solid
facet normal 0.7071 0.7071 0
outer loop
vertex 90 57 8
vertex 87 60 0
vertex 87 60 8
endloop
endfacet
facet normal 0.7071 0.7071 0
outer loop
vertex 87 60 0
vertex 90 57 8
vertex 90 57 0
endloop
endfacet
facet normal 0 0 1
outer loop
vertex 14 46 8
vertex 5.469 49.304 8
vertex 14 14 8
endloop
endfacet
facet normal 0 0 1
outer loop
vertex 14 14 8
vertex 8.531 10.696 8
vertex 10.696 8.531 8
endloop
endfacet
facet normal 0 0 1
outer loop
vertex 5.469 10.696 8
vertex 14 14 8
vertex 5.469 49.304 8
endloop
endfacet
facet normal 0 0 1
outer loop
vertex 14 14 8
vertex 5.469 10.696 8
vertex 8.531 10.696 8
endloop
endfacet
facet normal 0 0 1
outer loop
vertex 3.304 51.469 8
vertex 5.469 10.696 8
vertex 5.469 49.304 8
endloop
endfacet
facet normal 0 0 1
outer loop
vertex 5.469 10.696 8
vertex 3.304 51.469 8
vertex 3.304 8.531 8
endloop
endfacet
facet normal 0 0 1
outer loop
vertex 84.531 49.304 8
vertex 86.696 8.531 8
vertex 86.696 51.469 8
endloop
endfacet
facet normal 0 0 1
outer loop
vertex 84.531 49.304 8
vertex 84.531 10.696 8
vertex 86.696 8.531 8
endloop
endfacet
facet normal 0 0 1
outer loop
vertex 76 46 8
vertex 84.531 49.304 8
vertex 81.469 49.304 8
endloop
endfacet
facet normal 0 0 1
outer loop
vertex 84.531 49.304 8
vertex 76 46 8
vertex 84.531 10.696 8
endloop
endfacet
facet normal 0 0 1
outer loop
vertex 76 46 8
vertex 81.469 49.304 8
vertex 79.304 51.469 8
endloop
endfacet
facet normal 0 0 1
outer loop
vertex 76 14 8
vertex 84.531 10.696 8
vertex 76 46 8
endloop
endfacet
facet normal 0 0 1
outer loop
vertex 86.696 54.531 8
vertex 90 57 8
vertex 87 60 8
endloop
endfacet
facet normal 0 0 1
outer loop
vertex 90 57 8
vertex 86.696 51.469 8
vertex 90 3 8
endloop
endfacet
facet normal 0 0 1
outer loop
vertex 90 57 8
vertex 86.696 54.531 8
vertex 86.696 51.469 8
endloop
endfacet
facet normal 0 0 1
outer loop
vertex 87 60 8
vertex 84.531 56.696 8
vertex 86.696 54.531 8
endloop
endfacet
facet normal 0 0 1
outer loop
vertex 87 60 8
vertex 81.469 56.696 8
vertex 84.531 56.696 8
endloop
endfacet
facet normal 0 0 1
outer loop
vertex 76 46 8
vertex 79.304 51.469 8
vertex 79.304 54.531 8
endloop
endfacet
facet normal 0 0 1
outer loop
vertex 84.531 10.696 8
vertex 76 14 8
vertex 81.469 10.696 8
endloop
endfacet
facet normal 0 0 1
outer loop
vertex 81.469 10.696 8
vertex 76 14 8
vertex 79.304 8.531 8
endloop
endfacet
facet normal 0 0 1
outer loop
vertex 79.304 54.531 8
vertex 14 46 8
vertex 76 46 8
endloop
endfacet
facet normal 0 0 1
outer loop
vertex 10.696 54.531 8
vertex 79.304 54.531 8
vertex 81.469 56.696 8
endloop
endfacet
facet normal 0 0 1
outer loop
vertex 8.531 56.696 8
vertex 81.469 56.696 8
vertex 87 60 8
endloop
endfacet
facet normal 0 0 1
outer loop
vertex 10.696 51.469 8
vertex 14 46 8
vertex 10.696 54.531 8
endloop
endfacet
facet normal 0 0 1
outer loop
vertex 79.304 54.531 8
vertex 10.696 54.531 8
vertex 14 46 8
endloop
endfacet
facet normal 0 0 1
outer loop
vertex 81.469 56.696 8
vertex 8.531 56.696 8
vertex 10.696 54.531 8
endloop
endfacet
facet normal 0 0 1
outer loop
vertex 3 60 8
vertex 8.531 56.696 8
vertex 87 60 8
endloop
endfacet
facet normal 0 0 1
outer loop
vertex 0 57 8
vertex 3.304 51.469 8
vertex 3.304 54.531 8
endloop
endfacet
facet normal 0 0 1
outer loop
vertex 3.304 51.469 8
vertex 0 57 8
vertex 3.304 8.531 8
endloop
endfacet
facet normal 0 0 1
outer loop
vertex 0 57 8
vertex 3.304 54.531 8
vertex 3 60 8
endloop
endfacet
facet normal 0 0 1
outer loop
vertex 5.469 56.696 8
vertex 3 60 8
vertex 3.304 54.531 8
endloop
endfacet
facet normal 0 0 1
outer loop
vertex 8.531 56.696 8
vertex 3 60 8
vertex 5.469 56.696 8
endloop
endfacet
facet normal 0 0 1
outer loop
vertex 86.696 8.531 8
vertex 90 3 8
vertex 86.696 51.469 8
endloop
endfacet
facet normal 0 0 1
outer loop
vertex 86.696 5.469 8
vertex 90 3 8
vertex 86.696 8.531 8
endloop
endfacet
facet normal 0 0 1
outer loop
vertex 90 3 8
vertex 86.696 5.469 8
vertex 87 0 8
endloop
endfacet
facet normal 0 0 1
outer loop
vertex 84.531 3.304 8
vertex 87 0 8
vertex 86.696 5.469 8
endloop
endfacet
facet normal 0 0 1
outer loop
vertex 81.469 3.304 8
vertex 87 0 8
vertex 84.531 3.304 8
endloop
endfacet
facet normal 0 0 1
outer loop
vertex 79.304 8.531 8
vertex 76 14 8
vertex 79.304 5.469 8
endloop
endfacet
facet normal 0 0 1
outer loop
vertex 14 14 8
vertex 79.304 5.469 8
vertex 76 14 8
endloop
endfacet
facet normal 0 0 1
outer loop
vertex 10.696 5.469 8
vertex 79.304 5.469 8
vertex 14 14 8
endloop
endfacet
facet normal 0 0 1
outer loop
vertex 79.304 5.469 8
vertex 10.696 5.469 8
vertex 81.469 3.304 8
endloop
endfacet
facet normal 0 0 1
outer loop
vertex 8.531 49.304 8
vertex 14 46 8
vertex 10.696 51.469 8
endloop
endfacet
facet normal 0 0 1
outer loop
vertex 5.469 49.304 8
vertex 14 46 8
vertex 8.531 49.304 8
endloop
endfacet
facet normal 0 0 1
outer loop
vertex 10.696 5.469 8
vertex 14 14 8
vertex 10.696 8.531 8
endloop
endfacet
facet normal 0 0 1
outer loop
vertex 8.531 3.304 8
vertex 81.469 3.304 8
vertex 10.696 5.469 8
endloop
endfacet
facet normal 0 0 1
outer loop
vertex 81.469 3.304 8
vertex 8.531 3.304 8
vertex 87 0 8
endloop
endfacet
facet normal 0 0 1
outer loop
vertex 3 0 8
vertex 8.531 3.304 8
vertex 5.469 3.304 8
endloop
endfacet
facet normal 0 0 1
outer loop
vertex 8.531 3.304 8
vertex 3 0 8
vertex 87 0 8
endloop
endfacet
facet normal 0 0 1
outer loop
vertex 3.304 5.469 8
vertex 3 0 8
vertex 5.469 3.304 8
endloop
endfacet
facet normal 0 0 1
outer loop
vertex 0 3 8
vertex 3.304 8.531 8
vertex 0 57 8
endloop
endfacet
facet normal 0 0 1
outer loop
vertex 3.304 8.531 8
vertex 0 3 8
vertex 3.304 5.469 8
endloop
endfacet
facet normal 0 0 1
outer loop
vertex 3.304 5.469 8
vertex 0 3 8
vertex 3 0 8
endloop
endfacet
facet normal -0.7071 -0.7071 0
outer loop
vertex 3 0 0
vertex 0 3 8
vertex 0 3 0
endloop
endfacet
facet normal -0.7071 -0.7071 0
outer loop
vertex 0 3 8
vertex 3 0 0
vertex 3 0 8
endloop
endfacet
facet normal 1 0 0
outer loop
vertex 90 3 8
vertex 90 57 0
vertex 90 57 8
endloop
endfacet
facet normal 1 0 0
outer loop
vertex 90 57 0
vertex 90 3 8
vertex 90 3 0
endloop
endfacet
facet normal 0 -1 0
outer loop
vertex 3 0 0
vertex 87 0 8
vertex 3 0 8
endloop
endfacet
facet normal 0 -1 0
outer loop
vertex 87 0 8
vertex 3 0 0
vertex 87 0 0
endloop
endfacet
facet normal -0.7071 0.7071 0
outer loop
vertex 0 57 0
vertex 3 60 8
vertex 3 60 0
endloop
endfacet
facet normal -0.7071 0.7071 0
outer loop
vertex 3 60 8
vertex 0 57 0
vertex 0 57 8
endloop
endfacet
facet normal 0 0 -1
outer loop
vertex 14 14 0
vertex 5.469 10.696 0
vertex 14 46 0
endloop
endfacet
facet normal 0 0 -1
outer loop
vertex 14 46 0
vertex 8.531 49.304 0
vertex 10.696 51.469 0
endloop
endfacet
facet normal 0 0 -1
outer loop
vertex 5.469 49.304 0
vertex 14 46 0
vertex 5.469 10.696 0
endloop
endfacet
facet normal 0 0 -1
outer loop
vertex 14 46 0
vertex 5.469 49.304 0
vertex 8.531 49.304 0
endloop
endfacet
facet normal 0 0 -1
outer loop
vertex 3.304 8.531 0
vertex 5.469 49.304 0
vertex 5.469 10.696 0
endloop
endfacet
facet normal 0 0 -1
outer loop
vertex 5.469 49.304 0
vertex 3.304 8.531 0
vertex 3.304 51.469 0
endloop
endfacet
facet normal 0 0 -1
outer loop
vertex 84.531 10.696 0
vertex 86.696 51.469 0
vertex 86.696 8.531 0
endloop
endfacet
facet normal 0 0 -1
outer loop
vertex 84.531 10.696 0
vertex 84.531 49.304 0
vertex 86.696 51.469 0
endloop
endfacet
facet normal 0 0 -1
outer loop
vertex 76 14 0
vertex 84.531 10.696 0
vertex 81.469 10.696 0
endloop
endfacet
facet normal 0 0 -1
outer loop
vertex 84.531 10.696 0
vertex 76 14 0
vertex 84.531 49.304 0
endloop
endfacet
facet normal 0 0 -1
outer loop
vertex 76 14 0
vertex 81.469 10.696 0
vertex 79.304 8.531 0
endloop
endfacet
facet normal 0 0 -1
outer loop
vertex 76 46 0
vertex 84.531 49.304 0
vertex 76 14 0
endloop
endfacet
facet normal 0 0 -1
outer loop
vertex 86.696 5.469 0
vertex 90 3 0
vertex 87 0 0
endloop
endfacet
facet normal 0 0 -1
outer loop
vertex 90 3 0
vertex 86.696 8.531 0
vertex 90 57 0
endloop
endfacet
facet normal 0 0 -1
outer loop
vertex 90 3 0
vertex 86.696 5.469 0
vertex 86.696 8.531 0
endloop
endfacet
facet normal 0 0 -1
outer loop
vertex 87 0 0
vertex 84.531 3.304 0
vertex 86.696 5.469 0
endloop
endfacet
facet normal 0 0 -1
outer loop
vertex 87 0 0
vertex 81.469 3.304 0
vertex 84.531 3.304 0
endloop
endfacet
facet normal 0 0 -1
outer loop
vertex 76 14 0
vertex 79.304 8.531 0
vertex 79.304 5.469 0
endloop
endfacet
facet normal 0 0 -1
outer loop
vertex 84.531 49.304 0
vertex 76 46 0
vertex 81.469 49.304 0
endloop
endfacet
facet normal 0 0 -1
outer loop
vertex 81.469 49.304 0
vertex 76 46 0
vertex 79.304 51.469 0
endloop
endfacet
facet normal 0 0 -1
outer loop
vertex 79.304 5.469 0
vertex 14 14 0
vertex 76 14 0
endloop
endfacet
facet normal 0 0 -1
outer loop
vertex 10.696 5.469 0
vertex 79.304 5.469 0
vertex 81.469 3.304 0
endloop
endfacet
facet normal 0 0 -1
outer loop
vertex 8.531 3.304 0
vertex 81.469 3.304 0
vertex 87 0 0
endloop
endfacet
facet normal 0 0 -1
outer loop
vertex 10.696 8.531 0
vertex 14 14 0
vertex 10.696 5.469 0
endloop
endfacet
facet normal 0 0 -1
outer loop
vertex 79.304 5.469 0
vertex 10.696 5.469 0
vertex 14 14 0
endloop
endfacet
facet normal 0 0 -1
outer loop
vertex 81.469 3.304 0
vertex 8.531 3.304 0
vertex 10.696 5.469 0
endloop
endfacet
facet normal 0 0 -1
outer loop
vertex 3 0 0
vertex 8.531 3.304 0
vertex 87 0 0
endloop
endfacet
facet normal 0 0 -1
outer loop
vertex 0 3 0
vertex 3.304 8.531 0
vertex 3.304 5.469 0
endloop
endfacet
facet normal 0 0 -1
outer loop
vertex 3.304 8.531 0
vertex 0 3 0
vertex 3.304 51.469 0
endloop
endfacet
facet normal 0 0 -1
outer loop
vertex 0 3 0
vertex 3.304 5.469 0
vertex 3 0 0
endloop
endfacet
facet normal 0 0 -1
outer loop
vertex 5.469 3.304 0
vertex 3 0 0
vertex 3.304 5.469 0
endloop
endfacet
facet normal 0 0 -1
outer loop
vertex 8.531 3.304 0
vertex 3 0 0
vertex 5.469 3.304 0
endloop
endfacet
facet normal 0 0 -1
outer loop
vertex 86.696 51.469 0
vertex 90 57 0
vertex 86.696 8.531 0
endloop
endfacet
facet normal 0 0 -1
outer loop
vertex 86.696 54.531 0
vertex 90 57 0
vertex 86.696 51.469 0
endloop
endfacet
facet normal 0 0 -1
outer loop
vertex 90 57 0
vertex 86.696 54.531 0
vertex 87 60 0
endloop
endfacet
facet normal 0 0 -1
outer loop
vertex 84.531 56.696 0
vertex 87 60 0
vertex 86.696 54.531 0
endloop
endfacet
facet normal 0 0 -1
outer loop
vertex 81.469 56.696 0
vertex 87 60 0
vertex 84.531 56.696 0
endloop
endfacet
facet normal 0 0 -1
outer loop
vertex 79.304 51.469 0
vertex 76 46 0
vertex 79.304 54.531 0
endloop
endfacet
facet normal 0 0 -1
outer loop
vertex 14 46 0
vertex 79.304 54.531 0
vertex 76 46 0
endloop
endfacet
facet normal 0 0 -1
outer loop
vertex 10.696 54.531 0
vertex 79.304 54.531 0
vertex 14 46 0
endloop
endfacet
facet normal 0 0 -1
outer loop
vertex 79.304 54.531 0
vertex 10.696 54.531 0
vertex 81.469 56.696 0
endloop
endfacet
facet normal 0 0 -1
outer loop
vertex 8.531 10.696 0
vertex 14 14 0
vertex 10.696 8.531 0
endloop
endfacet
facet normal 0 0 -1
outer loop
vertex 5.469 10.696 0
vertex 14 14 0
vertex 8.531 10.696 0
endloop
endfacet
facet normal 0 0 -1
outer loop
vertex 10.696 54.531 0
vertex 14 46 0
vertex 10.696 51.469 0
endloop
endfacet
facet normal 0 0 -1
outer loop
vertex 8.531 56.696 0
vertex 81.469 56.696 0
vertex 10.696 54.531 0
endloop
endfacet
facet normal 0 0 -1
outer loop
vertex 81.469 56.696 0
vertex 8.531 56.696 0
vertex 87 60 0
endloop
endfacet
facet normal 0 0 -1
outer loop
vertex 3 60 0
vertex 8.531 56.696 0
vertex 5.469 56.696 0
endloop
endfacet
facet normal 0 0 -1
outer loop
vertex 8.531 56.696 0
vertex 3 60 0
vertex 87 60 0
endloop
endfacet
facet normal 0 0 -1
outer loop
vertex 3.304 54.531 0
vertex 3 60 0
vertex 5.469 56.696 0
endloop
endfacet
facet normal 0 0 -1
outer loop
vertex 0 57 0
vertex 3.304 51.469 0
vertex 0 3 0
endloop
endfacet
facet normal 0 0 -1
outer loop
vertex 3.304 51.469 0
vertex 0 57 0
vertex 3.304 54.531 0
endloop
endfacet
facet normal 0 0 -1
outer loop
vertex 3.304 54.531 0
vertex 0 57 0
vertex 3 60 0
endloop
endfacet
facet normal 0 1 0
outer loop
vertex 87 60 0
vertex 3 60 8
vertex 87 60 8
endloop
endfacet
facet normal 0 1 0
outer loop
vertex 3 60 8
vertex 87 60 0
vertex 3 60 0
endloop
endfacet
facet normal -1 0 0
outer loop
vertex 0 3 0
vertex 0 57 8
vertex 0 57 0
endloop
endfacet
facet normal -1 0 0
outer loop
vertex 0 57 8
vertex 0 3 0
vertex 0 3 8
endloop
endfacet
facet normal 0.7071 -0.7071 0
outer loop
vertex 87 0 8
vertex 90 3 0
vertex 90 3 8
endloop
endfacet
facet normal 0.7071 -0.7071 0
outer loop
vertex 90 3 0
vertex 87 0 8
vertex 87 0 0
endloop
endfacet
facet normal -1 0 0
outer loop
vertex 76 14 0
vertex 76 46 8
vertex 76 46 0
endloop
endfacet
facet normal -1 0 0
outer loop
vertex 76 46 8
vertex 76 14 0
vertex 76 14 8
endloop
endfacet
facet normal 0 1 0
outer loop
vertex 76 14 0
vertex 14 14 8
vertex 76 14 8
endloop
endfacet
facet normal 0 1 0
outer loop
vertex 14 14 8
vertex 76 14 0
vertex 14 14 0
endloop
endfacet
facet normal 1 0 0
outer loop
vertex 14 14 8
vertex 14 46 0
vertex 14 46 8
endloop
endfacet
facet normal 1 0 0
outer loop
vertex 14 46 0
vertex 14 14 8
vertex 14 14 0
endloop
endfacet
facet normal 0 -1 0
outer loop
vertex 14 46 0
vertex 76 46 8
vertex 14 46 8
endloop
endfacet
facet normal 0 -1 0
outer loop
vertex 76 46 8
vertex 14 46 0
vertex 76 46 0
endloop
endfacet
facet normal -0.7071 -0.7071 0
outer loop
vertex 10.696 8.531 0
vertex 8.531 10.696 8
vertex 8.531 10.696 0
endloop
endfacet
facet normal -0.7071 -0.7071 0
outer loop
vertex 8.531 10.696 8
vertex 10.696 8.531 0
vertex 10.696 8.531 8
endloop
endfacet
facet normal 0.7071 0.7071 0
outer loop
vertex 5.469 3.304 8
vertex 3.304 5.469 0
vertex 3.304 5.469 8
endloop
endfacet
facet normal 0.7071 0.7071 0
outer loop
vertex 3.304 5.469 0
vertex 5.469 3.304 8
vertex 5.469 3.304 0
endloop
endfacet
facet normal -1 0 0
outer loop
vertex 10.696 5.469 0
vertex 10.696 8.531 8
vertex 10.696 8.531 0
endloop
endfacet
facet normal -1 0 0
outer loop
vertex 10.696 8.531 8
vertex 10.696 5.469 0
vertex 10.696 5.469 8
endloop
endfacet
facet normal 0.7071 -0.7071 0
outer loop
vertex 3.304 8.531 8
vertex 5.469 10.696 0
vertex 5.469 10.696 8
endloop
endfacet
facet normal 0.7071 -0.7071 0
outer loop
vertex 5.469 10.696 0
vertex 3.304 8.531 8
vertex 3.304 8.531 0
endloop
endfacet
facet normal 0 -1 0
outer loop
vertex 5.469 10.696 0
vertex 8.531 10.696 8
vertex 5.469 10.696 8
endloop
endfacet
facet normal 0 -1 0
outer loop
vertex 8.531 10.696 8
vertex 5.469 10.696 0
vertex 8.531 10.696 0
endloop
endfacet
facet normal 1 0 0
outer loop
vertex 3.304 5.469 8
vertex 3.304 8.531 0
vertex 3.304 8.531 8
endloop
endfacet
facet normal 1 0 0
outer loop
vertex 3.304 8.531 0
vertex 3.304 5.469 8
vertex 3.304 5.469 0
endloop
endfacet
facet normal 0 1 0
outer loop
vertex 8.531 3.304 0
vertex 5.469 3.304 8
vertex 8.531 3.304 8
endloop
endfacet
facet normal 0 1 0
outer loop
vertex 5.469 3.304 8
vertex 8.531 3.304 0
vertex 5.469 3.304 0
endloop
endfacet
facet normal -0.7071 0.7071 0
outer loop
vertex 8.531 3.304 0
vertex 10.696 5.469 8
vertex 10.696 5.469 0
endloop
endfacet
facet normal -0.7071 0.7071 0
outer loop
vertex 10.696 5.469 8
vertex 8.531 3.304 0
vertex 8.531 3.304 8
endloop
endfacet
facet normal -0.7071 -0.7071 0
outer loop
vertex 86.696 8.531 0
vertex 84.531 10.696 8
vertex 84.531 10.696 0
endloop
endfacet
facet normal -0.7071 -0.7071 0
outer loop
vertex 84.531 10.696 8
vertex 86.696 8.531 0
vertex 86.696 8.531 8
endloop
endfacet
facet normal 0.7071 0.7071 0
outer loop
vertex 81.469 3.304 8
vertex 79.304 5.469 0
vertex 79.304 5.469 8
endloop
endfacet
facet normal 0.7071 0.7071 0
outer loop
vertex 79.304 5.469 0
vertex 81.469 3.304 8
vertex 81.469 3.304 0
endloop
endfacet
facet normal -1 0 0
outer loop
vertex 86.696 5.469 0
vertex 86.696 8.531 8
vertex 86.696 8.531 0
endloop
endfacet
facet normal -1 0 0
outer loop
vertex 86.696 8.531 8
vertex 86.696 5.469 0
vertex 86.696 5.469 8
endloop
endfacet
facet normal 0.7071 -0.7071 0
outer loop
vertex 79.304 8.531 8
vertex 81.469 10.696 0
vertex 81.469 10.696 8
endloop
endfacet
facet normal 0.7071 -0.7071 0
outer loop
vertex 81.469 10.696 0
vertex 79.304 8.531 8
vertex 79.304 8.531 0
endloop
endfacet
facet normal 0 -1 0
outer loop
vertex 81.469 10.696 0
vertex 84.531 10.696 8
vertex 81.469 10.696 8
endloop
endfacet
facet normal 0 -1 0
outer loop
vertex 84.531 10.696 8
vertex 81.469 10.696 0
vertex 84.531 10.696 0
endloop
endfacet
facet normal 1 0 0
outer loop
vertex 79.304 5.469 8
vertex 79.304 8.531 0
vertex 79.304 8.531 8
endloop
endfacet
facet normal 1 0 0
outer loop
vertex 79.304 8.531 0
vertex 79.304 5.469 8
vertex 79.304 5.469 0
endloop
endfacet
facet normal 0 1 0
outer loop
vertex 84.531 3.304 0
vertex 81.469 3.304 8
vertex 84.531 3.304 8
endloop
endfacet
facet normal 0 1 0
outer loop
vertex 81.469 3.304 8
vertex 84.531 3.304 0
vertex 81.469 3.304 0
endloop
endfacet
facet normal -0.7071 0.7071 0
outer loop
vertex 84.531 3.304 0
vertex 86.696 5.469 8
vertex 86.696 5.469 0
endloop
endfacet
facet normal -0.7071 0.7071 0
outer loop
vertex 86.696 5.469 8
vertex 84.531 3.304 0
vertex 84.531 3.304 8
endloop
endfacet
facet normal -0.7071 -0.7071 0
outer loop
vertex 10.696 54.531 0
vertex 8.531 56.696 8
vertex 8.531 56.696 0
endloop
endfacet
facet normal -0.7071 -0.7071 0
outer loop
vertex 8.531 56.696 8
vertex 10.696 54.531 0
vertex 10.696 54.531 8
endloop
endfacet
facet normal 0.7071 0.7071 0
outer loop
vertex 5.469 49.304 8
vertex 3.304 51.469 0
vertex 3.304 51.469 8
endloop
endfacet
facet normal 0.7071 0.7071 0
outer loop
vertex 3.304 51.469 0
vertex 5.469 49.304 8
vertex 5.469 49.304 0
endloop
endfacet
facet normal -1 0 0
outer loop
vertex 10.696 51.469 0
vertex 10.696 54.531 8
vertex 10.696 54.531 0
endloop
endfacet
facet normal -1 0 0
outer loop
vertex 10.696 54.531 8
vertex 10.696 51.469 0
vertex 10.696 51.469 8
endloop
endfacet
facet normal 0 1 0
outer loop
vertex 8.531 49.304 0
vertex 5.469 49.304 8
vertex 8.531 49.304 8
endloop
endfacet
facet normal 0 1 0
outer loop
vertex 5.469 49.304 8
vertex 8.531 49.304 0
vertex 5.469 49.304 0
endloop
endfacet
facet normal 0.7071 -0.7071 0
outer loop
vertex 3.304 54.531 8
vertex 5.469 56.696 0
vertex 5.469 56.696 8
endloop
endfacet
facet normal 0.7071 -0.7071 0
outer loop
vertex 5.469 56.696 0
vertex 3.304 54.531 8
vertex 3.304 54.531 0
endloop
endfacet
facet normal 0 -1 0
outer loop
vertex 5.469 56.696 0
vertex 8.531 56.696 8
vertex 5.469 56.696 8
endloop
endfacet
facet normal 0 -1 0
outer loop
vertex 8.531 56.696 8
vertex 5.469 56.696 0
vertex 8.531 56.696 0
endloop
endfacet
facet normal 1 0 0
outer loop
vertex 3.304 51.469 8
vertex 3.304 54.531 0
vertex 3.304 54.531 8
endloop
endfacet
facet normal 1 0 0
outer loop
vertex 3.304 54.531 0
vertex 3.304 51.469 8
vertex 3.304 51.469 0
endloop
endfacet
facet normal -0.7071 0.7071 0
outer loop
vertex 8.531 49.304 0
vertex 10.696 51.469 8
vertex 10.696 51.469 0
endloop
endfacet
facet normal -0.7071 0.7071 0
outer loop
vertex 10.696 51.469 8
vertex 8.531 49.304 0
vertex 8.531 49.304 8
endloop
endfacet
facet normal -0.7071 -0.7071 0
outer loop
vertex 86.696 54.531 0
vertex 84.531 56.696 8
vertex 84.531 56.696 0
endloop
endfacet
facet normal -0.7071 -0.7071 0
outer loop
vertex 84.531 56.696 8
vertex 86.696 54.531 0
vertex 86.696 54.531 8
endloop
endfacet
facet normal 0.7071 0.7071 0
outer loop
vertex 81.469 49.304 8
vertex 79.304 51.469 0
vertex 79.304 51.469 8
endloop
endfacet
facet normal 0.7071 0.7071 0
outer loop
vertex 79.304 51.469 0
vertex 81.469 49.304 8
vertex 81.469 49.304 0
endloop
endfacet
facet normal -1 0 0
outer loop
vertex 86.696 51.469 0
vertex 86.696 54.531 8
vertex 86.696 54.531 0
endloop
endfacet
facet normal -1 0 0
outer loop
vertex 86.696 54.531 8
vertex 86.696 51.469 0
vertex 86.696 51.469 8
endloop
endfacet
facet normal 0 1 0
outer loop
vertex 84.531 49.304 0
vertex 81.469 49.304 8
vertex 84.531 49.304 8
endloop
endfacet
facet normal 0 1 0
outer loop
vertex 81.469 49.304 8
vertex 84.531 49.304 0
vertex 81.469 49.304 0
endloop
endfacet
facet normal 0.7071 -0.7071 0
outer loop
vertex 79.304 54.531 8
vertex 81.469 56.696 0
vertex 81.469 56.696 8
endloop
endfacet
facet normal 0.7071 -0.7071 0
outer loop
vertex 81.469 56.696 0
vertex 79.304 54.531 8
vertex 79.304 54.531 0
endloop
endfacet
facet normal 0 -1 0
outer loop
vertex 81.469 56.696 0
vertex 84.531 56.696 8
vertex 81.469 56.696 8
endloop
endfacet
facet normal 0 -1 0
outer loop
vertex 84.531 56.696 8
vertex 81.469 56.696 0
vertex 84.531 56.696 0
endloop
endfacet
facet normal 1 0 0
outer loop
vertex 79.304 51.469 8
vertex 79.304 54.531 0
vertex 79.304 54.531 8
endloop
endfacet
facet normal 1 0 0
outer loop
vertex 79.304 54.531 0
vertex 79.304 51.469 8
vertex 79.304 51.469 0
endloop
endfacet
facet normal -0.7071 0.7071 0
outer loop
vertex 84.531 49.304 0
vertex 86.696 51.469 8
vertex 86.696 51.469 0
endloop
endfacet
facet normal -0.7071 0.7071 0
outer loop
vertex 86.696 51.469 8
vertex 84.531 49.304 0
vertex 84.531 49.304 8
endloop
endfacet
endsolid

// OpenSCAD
$fn = 32;

// ----------------------------------------------------------------------
// Frame plate: 90 x 60 frame, 14 mm rails
// ----------------------------------------------------------------------

// --- parameters (mm) ---
plate_l = 90;             // plate length, X
plate_w = 60;             // plate width, Y
plate_t = 8;              // plate thickness, Z (extrusion height)
corner_c = 3;             // corner chamfer
frame_bar = 14;           // frame rail width
bolt_r = 4;               // corner bolt window radius
bolt_inset = 7;           // bolt centre inset from the edges

win_l = plate_l - 2 * frame_bar;  // window length
win_w = plate_w - 2 * frame_bar;  // window width
bolt_d = 2 * bolt_r;  // corner hole diameter

profile = [[3, 0], [87, 0], [90, 3], [90, 57], [87, 60], [3, 60], [0, 57], [0, 3]];  // primary outline, 8 points, counter clockwise
void_1 = [[14, 14], [76, 14], [76, 46], [14, 46]];  // the window, 4 points
void_2 = [[10.696, 8.531], [8.531, 10.696], [5.469, 10.696], [3.304, 8.531], [3.304, 5.469], [5.469, 3.304], [8.531, 3.304], [10.696, 5.469]];  // corner bolt window, 8 points
void_3 = [[86.696, 8.531], [84.531, 10.696], [81.469, 10.696], [79.304, 8.531], [79.304, 5.469], [81.469, 3.304], [84.531, 3.304], [86.696, 5.469]];  // corner bolt window, 8 points
void_4 = [[10.696, 54.531], [8.531, 56.696], [5.469, 56.696], [3.304, 54.531], [3.304, 51.469], [5.469, 49.304], [8.531, 49.304], [10.696, 51.469]];  // corner bolt window, 8 points
void_5 = [[86.696, 54.531], [84.531, 56.696], [81.469, 56.696], [79.304, 54.531], [79.304, 51.469], [81.469, 49.304], [84.531, 49.304], [86.696, 51.469]];  // corner bolt window, 8 points

// --- the one profile operation ---
difference() {
  linear_extrude(height = plate_t) polygon(points = profile);
  translate([0, 0, -1])
    linear_extrude(height = plate_t + 2) polygon(points = void_1);
  translate([0, 0, -1])
    linear_extrude(height = plate_t + 2) polygon(points = void_2);
  translate([0, 0, -1])
    linear_extrude(height = plate_t + 2) polygon(points = void_3);
  translate([0, 0, -1])
    linear_extrude(height = plate_t + 2) polygon(points = void_4);
  translate([0, 0, -1])
    linear_extrude(height = plate_t + 2) polygon(points = void_5);
}
